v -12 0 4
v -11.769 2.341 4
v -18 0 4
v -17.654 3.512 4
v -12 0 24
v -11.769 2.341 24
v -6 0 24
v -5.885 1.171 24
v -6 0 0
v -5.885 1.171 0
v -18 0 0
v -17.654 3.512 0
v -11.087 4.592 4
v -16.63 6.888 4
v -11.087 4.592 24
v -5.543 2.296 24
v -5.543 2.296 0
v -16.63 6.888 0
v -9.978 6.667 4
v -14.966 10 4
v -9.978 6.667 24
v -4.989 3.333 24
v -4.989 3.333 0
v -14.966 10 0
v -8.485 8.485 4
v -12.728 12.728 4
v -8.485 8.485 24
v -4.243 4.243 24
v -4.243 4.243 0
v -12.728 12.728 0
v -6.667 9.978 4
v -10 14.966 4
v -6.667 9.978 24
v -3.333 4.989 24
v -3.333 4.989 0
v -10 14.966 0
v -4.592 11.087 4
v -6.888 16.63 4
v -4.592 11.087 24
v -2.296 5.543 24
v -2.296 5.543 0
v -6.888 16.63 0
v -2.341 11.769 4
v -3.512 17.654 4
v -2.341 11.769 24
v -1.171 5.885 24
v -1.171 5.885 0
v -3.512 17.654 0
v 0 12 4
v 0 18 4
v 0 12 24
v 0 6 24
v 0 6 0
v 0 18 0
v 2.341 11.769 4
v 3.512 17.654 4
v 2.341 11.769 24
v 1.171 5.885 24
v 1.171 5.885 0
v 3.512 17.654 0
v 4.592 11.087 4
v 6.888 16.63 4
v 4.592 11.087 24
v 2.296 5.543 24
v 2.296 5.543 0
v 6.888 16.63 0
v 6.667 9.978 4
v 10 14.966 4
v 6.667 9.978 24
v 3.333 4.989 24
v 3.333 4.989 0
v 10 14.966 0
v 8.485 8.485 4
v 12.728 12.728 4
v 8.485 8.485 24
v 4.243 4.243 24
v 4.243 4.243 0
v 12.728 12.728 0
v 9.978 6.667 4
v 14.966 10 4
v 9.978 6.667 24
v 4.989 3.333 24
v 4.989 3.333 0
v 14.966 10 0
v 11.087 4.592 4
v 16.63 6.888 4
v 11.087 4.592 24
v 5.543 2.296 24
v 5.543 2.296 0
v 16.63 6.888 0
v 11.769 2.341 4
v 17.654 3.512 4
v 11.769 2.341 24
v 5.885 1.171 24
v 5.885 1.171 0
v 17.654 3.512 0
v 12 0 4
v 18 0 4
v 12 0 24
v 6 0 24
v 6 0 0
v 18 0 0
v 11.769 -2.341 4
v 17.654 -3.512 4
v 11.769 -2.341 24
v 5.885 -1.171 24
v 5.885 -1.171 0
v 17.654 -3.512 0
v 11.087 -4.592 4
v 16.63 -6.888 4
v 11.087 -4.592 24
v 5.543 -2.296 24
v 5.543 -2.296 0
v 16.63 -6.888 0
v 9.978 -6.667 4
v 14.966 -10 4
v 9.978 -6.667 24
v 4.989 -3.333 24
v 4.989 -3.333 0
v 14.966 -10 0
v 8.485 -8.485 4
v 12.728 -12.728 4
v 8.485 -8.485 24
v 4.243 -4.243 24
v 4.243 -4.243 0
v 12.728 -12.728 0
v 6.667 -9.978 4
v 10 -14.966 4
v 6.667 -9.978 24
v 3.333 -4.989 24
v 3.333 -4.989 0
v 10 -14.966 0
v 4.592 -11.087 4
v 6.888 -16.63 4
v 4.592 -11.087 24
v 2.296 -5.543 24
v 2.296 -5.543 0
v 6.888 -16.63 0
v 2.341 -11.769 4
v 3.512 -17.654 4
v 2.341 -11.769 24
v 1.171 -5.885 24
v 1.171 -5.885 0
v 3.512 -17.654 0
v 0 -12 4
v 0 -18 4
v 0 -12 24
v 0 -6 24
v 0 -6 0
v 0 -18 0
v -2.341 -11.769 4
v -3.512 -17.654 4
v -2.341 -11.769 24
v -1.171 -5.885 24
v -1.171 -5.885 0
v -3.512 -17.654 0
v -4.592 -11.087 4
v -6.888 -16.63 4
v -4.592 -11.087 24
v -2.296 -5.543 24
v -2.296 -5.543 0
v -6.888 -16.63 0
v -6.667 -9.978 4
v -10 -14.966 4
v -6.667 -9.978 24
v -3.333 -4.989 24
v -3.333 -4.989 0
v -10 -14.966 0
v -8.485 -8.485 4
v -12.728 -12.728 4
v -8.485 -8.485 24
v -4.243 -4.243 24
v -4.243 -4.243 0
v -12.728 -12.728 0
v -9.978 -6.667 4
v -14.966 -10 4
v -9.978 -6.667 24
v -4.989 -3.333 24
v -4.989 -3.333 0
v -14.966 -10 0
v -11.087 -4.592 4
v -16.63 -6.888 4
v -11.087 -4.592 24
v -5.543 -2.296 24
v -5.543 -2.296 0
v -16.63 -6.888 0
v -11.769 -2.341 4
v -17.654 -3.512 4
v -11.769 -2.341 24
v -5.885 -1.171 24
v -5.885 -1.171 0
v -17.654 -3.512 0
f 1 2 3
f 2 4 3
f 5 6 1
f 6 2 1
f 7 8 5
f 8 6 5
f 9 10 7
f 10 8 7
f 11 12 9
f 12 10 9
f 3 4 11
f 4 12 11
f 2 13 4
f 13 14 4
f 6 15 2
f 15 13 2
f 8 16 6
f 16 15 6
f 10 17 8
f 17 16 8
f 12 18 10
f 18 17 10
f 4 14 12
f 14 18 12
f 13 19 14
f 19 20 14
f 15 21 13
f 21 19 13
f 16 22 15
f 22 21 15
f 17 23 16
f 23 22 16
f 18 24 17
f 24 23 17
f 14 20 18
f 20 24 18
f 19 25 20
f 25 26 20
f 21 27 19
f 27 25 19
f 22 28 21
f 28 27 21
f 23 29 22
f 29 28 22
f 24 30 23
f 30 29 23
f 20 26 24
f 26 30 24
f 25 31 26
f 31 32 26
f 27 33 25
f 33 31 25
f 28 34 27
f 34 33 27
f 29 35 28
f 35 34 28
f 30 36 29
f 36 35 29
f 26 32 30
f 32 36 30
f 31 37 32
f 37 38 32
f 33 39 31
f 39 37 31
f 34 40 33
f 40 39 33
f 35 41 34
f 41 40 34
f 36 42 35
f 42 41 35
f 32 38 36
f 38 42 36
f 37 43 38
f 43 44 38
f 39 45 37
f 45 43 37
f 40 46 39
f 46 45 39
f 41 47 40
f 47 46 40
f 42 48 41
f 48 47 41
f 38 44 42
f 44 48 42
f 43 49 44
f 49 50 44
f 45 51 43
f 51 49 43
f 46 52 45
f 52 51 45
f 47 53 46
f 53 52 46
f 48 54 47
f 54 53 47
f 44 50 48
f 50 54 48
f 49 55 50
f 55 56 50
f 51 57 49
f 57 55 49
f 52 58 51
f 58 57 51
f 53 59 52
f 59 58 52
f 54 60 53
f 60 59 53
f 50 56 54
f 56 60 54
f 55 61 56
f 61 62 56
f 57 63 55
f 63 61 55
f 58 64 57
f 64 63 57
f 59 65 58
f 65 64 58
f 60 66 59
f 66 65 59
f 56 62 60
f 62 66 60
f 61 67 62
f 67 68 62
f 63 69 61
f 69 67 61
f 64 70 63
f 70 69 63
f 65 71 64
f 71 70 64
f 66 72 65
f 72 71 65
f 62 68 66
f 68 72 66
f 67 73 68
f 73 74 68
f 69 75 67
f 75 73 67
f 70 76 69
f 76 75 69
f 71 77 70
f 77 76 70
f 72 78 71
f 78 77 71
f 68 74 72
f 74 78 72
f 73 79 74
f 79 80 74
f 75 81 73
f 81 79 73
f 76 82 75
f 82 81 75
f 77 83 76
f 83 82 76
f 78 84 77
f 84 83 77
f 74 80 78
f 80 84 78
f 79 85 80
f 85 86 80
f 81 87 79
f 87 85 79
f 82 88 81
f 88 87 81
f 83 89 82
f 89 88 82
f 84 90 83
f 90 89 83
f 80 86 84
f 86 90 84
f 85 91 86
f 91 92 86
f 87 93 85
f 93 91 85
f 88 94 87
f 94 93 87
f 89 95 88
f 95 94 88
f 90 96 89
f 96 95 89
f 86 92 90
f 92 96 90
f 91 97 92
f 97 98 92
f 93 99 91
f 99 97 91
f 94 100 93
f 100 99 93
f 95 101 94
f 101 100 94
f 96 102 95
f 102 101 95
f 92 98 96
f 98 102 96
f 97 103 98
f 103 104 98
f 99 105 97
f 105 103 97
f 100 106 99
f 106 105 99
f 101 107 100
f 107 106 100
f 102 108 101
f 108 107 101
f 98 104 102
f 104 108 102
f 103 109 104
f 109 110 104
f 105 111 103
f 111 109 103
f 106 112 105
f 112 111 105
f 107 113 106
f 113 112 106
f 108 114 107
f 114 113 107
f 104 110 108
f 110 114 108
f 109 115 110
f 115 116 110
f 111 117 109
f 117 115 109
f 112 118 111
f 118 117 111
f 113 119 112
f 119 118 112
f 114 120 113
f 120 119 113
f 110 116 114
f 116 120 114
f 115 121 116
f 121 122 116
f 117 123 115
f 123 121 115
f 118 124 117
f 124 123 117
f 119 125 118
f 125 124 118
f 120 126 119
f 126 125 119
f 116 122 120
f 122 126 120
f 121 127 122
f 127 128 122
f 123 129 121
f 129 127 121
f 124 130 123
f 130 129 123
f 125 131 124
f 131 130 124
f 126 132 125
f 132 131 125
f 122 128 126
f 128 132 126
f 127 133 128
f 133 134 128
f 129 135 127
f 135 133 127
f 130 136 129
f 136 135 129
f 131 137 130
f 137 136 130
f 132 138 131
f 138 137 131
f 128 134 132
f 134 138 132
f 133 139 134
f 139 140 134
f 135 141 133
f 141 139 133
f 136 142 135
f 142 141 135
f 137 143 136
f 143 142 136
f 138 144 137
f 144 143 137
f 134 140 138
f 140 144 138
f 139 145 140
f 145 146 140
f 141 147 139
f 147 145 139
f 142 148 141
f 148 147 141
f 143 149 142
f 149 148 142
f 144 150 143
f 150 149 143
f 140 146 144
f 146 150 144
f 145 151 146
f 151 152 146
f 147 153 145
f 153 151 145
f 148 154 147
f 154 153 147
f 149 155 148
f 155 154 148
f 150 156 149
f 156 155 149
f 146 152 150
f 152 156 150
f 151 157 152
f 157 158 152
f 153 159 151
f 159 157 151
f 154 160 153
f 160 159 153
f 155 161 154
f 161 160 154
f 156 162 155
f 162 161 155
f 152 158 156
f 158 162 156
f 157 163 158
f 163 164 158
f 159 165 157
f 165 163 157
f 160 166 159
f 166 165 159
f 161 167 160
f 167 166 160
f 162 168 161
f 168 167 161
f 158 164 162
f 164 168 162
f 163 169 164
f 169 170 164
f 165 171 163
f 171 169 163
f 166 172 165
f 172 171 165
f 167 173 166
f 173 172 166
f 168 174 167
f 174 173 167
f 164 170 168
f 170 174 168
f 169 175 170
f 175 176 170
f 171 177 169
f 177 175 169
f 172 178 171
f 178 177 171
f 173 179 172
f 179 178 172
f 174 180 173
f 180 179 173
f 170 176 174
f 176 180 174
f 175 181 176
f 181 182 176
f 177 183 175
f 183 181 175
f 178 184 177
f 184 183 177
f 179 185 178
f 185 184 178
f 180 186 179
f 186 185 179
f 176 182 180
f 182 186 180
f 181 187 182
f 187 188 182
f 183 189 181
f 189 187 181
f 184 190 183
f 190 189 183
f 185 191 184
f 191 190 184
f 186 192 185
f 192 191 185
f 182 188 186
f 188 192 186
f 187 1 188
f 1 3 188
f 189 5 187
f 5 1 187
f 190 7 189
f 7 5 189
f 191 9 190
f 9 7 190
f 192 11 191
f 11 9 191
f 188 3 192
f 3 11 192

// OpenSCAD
$fn = 32;

// ----------------------------------------------------------------------
// Revolved part: flanged bushing R18
// ----------------------------------------------------------------------

// --- parameters (mm) ---
bore_r = 6;               // bore radius
flange_r = 18;            // flange radius
flange_h = 4;             // flange thickness
sleeve_r = 12;            // sleeve radius
total_h = 24;             // overall height
revolve_angle = 360;      // revolve sweep, degrees

bore_d = 2 * bore_r;
flange_d = 2 * flange_r;
sleeve_d = 2 * sleeve_r;

profile = [[6, 0], [18, 0], [18, 4], [12, 4], [12, 24], [6, 24]];  // primary outline, 6 points, counter clockwise

// --- the one profile operation ---
rotate_extrude(angle = revolve_angle) polygon(points = profile);
